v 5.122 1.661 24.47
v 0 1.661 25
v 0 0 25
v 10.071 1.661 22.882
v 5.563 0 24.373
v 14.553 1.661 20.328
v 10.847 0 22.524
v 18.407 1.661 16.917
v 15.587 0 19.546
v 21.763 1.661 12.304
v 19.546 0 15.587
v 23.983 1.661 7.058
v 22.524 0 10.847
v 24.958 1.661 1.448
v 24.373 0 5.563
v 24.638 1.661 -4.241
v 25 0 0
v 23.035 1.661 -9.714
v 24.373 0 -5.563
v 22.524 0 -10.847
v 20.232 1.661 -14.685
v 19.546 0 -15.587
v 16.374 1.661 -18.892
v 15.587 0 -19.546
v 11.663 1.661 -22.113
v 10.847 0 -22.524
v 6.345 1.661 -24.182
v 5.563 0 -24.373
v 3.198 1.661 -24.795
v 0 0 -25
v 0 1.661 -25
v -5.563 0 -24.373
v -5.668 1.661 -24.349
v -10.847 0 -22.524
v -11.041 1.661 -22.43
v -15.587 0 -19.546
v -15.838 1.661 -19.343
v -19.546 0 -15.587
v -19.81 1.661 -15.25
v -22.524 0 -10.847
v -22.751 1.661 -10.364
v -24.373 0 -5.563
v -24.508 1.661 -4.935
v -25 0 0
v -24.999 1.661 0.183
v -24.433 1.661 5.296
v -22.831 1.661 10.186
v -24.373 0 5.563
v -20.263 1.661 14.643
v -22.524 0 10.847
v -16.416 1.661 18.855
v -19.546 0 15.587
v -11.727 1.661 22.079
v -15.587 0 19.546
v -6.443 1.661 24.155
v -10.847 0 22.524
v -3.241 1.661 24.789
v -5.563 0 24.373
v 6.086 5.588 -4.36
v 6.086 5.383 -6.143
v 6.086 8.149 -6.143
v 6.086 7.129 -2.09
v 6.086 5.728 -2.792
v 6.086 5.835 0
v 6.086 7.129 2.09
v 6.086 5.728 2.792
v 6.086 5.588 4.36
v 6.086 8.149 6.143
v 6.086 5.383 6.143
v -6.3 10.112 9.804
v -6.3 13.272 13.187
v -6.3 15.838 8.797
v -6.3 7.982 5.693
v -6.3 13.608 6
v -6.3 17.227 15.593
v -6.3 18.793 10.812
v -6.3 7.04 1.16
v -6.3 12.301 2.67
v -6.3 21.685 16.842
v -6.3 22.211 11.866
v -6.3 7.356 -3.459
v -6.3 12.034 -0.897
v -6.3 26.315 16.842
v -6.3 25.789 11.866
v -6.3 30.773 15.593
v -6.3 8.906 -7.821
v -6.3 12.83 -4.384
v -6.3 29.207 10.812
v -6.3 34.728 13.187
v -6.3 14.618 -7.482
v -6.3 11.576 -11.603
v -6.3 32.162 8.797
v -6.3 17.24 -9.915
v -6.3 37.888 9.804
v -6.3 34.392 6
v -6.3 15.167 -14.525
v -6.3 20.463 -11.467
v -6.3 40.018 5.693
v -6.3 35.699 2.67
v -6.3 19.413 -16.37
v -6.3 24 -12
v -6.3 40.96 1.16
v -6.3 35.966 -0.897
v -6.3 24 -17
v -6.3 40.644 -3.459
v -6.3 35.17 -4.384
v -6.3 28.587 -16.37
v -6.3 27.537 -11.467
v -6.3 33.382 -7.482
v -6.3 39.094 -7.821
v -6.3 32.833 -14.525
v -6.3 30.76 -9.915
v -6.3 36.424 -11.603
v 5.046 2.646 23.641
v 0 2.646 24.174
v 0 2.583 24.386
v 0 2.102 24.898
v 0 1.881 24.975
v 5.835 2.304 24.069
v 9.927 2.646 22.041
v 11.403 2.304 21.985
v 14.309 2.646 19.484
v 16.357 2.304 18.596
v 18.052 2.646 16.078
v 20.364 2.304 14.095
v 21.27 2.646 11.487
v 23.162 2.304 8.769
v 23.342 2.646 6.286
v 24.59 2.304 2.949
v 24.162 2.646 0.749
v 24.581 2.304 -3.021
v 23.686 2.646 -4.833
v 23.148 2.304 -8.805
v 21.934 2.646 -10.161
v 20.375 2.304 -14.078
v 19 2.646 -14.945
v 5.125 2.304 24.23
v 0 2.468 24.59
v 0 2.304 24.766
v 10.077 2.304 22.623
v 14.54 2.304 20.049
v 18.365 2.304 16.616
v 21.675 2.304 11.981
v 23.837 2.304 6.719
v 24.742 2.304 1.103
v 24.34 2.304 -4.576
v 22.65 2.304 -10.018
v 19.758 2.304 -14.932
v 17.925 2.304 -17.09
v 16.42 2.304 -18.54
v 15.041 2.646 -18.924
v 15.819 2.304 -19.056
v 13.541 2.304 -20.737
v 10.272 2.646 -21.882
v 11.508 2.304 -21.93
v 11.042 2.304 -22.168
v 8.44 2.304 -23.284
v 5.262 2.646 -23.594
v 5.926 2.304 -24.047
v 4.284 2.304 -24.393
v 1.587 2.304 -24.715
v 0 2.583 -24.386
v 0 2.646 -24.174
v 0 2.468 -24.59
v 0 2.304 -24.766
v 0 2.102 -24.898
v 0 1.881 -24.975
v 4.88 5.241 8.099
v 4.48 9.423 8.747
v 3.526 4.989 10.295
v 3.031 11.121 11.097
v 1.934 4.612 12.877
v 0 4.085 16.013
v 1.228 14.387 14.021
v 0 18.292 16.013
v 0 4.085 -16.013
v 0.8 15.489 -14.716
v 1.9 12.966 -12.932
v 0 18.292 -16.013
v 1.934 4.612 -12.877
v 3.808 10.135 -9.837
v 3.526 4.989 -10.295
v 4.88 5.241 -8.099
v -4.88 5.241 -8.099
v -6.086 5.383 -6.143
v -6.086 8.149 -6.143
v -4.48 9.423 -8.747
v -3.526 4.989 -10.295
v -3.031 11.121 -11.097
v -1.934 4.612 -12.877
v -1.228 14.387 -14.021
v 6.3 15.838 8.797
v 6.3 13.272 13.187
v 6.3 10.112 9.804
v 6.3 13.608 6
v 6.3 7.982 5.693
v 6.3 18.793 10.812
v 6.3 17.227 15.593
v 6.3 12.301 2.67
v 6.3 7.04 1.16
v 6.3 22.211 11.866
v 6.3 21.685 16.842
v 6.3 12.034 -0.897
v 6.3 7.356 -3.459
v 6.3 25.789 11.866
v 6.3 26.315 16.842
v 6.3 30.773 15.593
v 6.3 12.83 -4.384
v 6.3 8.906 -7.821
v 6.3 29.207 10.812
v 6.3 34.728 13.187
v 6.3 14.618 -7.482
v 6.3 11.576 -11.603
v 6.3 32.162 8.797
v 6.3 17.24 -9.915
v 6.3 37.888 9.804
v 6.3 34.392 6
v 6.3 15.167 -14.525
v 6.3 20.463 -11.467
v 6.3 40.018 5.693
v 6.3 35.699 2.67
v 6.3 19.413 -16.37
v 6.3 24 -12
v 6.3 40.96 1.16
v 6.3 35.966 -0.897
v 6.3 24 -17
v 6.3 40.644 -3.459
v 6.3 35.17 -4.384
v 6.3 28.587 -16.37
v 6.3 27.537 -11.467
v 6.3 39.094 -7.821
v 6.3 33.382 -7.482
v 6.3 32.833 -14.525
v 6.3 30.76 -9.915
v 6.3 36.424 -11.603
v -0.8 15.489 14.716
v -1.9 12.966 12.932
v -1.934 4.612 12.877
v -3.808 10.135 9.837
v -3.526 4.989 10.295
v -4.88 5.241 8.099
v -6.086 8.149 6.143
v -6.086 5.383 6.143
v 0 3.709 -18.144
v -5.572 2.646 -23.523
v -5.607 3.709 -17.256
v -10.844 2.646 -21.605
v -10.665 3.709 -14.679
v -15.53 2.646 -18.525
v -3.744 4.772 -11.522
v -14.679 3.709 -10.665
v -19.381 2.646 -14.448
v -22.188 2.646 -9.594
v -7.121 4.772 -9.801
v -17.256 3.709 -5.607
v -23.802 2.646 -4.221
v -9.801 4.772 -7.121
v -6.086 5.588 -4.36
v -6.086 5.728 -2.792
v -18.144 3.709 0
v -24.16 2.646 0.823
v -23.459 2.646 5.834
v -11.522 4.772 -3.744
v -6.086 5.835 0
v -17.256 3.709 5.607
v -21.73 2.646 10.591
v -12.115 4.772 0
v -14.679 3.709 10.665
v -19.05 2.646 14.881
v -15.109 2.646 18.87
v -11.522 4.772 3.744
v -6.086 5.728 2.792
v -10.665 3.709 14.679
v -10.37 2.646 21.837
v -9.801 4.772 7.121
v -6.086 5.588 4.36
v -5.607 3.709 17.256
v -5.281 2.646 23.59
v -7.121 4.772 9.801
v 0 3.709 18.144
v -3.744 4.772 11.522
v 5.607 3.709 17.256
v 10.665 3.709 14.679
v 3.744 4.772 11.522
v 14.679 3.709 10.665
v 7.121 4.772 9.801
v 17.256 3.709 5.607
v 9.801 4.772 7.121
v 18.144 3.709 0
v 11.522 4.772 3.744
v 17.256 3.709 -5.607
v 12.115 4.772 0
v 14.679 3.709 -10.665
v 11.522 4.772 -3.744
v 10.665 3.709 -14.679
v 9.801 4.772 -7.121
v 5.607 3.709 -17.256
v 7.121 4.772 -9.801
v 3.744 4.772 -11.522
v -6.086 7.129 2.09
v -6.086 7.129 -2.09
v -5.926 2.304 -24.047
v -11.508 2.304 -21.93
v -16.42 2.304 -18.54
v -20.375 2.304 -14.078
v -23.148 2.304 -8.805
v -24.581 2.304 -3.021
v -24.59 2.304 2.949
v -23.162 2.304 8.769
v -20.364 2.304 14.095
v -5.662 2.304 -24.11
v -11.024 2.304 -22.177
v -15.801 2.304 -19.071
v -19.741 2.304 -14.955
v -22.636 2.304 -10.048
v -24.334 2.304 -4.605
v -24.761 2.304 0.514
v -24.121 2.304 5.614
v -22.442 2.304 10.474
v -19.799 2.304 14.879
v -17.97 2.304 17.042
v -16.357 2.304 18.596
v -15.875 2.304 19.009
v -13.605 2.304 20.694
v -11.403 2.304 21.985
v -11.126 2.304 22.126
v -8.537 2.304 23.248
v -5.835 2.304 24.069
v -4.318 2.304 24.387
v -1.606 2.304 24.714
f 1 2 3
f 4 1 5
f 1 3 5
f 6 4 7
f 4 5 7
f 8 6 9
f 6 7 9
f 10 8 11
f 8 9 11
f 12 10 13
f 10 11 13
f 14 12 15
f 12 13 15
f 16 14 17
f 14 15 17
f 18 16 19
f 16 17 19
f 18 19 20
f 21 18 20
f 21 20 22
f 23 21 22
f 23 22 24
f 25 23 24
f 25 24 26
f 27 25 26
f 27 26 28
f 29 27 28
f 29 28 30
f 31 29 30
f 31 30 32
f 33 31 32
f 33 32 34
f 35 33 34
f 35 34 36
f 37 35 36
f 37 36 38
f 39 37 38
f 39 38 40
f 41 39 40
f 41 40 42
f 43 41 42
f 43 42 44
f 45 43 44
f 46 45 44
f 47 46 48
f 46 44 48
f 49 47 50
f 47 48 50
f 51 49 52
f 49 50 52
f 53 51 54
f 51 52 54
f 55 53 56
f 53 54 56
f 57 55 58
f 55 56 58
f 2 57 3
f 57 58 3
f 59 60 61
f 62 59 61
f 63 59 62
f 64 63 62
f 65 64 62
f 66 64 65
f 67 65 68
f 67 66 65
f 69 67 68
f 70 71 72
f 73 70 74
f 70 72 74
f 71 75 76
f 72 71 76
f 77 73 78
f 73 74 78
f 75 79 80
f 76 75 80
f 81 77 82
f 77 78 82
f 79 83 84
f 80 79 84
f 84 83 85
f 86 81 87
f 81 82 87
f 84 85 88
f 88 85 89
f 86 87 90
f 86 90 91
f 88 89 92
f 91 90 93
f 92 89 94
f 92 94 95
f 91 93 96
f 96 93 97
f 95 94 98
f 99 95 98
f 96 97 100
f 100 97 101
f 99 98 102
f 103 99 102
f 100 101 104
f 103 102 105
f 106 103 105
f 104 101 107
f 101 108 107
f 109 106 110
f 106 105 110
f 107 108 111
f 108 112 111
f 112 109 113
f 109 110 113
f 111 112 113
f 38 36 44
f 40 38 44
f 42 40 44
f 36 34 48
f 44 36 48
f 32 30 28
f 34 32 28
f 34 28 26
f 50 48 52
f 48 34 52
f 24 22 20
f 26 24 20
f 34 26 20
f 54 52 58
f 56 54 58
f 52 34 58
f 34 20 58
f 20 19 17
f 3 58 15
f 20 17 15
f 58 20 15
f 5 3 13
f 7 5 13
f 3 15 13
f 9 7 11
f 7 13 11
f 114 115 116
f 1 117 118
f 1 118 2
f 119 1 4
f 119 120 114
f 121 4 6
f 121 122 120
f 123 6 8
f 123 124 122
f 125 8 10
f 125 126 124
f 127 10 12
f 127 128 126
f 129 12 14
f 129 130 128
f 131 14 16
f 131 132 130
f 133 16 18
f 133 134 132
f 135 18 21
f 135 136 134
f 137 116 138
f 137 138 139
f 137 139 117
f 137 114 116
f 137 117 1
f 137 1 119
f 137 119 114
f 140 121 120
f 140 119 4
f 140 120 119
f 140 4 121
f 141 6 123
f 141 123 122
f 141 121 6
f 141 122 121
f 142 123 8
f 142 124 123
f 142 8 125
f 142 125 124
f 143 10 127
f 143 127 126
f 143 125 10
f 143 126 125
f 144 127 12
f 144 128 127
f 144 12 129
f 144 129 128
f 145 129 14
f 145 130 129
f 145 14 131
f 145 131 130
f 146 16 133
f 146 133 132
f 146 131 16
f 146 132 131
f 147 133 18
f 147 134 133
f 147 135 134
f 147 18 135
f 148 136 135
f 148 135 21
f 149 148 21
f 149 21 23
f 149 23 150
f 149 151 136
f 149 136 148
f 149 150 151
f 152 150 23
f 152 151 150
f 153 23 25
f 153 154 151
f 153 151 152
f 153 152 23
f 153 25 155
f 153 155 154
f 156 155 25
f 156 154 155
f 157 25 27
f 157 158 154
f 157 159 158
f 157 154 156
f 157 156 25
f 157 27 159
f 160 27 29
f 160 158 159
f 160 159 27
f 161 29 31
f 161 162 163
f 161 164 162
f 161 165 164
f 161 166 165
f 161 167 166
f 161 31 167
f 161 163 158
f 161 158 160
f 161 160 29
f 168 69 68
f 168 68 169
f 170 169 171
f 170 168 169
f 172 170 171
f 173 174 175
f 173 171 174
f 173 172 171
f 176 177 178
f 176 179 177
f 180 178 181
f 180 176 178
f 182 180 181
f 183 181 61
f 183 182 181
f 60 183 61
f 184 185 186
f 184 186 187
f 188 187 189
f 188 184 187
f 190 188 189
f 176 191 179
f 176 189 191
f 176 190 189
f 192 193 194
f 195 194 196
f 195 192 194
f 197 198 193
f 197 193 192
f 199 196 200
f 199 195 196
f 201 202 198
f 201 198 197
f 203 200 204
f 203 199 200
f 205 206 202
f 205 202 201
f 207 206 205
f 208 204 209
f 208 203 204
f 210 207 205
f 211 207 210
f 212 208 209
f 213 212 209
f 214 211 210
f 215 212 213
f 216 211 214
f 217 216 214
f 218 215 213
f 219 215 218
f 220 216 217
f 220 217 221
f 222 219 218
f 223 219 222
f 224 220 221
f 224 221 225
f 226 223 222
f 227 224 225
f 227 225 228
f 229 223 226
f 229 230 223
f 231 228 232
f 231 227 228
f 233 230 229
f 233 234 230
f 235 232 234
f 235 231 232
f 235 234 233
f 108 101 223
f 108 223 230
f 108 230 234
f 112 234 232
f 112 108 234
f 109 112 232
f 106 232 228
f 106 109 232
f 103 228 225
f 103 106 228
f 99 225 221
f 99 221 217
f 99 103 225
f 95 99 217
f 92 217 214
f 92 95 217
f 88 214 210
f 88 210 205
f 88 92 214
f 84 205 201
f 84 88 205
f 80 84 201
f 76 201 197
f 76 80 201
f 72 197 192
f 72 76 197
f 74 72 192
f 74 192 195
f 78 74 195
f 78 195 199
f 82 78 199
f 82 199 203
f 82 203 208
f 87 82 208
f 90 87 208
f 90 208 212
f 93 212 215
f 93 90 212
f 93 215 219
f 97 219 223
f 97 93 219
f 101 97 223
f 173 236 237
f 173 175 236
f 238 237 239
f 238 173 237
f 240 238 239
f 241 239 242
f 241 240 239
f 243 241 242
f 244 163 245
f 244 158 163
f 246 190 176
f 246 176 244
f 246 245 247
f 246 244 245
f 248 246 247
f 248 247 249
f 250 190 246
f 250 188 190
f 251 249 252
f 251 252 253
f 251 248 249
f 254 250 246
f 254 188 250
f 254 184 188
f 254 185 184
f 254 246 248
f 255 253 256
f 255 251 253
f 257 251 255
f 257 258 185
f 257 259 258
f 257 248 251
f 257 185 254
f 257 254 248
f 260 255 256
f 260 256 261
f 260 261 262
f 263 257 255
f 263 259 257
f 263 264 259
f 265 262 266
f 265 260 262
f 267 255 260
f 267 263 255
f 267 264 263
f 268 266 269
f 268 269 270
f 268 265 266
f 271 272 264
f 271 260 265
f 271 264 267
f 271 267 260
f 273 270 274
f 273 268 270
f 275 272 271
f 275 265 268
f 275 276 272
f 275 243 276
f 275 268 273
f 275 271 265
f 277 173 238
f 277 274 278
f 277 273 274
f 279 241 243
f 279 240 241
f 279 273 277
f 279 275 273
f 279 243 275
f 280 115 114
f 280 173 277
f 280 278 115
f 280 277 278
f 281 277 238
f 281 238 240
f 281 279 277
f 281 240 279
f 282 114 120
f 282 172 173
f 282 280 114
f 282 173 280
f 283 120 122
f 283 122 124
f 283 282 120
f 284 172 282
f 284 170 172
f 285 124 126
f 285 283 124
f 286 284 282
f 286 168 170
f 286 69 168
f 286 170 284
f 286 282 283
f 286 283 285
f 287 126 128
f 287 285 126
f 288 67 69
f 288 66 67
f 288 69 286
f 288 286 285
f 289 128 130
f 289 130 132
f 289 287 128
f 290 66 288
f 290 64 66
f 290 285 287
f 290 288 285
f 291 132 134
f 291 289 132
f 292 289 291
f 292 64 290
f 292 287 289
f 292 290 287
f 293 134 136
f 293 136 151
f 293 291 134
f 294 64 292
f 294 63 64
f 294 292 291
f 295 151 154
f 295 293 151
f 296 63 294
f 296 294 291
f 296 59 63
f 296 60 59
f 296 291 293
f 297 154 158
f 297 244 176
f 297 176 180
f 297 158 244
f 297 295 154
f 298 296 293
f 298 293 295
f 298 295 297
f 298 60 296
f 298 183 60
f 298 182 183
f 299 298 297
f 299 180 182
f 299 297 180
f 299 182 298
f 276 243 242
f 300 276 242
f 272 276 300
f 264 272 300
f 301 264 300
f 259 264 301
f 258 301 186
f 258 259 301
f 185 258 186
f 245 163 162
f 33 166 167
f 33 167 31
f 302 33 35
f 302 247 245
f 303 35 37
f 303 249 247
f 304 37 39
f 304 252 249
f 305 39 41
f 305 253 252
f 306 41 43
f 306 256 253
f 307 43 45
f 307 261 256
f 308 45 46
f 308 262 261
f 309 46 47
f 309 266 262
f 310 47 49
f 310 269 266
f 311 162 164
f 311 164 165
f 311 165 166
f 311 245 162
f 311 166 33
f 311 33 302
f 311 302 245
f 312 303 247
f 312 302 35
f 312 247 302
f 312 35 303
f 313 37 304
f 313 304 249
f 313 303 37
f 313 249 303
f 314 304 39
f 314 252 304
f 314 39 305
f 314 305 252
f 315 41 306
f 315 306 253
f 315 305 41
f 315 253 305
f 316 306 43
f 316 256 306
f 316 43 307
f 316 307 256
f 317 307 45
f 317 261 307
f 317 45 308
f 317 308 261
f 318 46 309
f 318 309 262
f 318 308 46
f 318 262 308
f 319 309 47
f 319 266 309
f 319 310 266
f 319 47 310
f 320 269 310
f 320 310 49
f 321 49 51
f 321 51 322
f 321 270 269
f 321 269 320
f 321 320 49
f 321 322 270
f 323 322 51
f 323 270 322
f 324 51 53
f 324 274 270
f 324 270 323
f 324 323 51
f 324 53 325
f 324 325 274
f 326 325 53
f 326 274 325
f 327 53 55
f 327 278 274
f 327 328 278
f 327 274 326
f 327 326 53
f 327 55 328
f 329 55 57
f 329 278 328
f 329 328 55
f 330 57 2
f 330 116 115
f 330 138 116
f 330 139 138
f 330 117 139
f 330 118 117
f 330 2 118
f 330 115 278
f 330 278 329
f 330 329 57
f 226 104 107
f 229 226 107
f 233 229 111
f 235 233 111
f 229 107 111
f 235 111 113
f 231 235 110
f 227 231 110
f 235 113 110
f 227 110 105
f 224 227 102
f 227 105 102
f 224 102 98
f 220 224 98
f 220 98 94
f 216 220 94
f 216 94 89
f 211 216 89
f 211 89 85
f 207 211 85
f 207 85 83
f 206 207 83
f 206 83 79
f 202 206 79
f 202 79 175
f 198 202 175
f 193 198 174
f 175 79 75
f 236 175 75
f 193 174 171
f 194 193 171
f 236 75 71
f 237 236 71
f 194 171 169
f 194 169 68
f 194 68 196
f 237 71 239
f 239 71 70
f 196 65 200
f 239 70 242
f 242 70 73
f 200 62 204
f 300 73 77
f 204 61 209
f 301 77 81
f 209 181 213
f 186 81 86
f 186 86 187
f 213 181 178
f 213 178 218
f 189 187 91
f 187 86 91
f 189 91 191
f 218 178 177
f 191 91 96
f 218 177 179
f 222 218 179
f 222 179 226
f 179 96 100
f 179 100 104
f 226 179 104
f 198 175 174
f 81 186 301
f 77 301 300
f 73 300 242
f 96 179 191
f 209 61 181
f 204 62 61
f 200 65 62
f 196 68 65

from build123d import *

# Parameters (mm, degrees)
SKETCH1_R                 = 25
BOSS_EXTRUDE1_DEPTH       = 2.5
FILLET1_R                 = 1
BOSS_EXTRUDE9_DEPTH       = 15
BOSS_EXTRUDE11_DEPTH      = 6.3
BOSS_EXTRUDE11_DEPTH_BACK = 6.3
SKETCH5_R                 = 17
CUT_EXTRUDE3_DEPTH        = 6.3
CUT_EXTRUDE3_DEPTH_BACK   = 6.3
SKETCH6_R                 = 12


with BuildPart() as part:
    # Sketch1 → Boss-Extrude1 (new body)
    with BuildSketch(Plane(origin=(0, 0, 0), x_dir=(1, 0, 0), z_dir=(0, 1, 0))):
        with Locations(Location((0, 0, 0), (0, 0, 270))):
            Circle(SKETCH1_R)
    extrude(amount=BOSS_EXTRUDE1_DEPTH)

    # Boss-Extrude3 cone 1 section (through the dimple's axis) → Boss-Extrude3 (revolve)
    with BuildSketch(Plane(origin=(0, 2.5, 0), x_dir=(0, 0, -1), z_dir=(1, 0, 0))):
        Polygon((0, 0), (25, 0), (0, 4.408174518), align=None)
    revolve(axis=Axis((0, 2.5, 0), (0, 1, 0)))

    # Fillet1
    fillet1_edges = [part.edges().sort_by_distance(p)[0] for p in [
        (-25, 2.5, 0),
    ]]
    fillet(fillet1_edges, radius=FILLET1_R)

    # Sketch4 → Boss-Extrude9 (add)
    with BuildSketch(Plane(origin=(0, 4, 0), x_dir=(-1, 0, 0), z_dir=(0, 1, 0))):
        Polygon((-6.085829464, 6.143185176), (0, 16.013255457), (6.085829464, 6.143185176), (6.085829464, -6.143185176), (0, -16.013255457), (-6.085829464, -6.143185176), align=None)
    extrude(amount=BOSS_EXTRUDE9_DEPTH)

    # Sketch5 → Boss-Extrude11 (add, two sides: drawn at the far end of the back side and taken through both)
    with BuildSketch(Plane(origin=(0, 0, 0), x_dir=(0, 0, -1), z_dir=(1, 0, 0)).offset(-BOSS_EXTRUDE11_DEPTH_BACK)):
        with Locations((0, 24)):
            Circle(SKETCH5_R)
    extrude(amount=BOSS_EXTRUDE11_DEPTH + BOSS_EXTRUDE11_DEPTH_BACK)

    # Sketch6 → Cut-Extrude3 (cut, two sides: drawn at the far end of the back side and taken through both)
    with BuildSketch(Plane(origin=(0, 0, 0), x_dir=(0, 0, -1), z_dir=(1, 0, 0)).offset(-CUT_EXTRUDE3_DEPTH_BACK)):
        with Locations((0, 24)):
            Circle(SKETCH6_R)
    extrude(amount=CUT_EXTRUDE3_DEPTH + CUT_EXTRUDE3_DEPTH_BACK, mode=Mode.SUBTRACT)


solid = part.part
